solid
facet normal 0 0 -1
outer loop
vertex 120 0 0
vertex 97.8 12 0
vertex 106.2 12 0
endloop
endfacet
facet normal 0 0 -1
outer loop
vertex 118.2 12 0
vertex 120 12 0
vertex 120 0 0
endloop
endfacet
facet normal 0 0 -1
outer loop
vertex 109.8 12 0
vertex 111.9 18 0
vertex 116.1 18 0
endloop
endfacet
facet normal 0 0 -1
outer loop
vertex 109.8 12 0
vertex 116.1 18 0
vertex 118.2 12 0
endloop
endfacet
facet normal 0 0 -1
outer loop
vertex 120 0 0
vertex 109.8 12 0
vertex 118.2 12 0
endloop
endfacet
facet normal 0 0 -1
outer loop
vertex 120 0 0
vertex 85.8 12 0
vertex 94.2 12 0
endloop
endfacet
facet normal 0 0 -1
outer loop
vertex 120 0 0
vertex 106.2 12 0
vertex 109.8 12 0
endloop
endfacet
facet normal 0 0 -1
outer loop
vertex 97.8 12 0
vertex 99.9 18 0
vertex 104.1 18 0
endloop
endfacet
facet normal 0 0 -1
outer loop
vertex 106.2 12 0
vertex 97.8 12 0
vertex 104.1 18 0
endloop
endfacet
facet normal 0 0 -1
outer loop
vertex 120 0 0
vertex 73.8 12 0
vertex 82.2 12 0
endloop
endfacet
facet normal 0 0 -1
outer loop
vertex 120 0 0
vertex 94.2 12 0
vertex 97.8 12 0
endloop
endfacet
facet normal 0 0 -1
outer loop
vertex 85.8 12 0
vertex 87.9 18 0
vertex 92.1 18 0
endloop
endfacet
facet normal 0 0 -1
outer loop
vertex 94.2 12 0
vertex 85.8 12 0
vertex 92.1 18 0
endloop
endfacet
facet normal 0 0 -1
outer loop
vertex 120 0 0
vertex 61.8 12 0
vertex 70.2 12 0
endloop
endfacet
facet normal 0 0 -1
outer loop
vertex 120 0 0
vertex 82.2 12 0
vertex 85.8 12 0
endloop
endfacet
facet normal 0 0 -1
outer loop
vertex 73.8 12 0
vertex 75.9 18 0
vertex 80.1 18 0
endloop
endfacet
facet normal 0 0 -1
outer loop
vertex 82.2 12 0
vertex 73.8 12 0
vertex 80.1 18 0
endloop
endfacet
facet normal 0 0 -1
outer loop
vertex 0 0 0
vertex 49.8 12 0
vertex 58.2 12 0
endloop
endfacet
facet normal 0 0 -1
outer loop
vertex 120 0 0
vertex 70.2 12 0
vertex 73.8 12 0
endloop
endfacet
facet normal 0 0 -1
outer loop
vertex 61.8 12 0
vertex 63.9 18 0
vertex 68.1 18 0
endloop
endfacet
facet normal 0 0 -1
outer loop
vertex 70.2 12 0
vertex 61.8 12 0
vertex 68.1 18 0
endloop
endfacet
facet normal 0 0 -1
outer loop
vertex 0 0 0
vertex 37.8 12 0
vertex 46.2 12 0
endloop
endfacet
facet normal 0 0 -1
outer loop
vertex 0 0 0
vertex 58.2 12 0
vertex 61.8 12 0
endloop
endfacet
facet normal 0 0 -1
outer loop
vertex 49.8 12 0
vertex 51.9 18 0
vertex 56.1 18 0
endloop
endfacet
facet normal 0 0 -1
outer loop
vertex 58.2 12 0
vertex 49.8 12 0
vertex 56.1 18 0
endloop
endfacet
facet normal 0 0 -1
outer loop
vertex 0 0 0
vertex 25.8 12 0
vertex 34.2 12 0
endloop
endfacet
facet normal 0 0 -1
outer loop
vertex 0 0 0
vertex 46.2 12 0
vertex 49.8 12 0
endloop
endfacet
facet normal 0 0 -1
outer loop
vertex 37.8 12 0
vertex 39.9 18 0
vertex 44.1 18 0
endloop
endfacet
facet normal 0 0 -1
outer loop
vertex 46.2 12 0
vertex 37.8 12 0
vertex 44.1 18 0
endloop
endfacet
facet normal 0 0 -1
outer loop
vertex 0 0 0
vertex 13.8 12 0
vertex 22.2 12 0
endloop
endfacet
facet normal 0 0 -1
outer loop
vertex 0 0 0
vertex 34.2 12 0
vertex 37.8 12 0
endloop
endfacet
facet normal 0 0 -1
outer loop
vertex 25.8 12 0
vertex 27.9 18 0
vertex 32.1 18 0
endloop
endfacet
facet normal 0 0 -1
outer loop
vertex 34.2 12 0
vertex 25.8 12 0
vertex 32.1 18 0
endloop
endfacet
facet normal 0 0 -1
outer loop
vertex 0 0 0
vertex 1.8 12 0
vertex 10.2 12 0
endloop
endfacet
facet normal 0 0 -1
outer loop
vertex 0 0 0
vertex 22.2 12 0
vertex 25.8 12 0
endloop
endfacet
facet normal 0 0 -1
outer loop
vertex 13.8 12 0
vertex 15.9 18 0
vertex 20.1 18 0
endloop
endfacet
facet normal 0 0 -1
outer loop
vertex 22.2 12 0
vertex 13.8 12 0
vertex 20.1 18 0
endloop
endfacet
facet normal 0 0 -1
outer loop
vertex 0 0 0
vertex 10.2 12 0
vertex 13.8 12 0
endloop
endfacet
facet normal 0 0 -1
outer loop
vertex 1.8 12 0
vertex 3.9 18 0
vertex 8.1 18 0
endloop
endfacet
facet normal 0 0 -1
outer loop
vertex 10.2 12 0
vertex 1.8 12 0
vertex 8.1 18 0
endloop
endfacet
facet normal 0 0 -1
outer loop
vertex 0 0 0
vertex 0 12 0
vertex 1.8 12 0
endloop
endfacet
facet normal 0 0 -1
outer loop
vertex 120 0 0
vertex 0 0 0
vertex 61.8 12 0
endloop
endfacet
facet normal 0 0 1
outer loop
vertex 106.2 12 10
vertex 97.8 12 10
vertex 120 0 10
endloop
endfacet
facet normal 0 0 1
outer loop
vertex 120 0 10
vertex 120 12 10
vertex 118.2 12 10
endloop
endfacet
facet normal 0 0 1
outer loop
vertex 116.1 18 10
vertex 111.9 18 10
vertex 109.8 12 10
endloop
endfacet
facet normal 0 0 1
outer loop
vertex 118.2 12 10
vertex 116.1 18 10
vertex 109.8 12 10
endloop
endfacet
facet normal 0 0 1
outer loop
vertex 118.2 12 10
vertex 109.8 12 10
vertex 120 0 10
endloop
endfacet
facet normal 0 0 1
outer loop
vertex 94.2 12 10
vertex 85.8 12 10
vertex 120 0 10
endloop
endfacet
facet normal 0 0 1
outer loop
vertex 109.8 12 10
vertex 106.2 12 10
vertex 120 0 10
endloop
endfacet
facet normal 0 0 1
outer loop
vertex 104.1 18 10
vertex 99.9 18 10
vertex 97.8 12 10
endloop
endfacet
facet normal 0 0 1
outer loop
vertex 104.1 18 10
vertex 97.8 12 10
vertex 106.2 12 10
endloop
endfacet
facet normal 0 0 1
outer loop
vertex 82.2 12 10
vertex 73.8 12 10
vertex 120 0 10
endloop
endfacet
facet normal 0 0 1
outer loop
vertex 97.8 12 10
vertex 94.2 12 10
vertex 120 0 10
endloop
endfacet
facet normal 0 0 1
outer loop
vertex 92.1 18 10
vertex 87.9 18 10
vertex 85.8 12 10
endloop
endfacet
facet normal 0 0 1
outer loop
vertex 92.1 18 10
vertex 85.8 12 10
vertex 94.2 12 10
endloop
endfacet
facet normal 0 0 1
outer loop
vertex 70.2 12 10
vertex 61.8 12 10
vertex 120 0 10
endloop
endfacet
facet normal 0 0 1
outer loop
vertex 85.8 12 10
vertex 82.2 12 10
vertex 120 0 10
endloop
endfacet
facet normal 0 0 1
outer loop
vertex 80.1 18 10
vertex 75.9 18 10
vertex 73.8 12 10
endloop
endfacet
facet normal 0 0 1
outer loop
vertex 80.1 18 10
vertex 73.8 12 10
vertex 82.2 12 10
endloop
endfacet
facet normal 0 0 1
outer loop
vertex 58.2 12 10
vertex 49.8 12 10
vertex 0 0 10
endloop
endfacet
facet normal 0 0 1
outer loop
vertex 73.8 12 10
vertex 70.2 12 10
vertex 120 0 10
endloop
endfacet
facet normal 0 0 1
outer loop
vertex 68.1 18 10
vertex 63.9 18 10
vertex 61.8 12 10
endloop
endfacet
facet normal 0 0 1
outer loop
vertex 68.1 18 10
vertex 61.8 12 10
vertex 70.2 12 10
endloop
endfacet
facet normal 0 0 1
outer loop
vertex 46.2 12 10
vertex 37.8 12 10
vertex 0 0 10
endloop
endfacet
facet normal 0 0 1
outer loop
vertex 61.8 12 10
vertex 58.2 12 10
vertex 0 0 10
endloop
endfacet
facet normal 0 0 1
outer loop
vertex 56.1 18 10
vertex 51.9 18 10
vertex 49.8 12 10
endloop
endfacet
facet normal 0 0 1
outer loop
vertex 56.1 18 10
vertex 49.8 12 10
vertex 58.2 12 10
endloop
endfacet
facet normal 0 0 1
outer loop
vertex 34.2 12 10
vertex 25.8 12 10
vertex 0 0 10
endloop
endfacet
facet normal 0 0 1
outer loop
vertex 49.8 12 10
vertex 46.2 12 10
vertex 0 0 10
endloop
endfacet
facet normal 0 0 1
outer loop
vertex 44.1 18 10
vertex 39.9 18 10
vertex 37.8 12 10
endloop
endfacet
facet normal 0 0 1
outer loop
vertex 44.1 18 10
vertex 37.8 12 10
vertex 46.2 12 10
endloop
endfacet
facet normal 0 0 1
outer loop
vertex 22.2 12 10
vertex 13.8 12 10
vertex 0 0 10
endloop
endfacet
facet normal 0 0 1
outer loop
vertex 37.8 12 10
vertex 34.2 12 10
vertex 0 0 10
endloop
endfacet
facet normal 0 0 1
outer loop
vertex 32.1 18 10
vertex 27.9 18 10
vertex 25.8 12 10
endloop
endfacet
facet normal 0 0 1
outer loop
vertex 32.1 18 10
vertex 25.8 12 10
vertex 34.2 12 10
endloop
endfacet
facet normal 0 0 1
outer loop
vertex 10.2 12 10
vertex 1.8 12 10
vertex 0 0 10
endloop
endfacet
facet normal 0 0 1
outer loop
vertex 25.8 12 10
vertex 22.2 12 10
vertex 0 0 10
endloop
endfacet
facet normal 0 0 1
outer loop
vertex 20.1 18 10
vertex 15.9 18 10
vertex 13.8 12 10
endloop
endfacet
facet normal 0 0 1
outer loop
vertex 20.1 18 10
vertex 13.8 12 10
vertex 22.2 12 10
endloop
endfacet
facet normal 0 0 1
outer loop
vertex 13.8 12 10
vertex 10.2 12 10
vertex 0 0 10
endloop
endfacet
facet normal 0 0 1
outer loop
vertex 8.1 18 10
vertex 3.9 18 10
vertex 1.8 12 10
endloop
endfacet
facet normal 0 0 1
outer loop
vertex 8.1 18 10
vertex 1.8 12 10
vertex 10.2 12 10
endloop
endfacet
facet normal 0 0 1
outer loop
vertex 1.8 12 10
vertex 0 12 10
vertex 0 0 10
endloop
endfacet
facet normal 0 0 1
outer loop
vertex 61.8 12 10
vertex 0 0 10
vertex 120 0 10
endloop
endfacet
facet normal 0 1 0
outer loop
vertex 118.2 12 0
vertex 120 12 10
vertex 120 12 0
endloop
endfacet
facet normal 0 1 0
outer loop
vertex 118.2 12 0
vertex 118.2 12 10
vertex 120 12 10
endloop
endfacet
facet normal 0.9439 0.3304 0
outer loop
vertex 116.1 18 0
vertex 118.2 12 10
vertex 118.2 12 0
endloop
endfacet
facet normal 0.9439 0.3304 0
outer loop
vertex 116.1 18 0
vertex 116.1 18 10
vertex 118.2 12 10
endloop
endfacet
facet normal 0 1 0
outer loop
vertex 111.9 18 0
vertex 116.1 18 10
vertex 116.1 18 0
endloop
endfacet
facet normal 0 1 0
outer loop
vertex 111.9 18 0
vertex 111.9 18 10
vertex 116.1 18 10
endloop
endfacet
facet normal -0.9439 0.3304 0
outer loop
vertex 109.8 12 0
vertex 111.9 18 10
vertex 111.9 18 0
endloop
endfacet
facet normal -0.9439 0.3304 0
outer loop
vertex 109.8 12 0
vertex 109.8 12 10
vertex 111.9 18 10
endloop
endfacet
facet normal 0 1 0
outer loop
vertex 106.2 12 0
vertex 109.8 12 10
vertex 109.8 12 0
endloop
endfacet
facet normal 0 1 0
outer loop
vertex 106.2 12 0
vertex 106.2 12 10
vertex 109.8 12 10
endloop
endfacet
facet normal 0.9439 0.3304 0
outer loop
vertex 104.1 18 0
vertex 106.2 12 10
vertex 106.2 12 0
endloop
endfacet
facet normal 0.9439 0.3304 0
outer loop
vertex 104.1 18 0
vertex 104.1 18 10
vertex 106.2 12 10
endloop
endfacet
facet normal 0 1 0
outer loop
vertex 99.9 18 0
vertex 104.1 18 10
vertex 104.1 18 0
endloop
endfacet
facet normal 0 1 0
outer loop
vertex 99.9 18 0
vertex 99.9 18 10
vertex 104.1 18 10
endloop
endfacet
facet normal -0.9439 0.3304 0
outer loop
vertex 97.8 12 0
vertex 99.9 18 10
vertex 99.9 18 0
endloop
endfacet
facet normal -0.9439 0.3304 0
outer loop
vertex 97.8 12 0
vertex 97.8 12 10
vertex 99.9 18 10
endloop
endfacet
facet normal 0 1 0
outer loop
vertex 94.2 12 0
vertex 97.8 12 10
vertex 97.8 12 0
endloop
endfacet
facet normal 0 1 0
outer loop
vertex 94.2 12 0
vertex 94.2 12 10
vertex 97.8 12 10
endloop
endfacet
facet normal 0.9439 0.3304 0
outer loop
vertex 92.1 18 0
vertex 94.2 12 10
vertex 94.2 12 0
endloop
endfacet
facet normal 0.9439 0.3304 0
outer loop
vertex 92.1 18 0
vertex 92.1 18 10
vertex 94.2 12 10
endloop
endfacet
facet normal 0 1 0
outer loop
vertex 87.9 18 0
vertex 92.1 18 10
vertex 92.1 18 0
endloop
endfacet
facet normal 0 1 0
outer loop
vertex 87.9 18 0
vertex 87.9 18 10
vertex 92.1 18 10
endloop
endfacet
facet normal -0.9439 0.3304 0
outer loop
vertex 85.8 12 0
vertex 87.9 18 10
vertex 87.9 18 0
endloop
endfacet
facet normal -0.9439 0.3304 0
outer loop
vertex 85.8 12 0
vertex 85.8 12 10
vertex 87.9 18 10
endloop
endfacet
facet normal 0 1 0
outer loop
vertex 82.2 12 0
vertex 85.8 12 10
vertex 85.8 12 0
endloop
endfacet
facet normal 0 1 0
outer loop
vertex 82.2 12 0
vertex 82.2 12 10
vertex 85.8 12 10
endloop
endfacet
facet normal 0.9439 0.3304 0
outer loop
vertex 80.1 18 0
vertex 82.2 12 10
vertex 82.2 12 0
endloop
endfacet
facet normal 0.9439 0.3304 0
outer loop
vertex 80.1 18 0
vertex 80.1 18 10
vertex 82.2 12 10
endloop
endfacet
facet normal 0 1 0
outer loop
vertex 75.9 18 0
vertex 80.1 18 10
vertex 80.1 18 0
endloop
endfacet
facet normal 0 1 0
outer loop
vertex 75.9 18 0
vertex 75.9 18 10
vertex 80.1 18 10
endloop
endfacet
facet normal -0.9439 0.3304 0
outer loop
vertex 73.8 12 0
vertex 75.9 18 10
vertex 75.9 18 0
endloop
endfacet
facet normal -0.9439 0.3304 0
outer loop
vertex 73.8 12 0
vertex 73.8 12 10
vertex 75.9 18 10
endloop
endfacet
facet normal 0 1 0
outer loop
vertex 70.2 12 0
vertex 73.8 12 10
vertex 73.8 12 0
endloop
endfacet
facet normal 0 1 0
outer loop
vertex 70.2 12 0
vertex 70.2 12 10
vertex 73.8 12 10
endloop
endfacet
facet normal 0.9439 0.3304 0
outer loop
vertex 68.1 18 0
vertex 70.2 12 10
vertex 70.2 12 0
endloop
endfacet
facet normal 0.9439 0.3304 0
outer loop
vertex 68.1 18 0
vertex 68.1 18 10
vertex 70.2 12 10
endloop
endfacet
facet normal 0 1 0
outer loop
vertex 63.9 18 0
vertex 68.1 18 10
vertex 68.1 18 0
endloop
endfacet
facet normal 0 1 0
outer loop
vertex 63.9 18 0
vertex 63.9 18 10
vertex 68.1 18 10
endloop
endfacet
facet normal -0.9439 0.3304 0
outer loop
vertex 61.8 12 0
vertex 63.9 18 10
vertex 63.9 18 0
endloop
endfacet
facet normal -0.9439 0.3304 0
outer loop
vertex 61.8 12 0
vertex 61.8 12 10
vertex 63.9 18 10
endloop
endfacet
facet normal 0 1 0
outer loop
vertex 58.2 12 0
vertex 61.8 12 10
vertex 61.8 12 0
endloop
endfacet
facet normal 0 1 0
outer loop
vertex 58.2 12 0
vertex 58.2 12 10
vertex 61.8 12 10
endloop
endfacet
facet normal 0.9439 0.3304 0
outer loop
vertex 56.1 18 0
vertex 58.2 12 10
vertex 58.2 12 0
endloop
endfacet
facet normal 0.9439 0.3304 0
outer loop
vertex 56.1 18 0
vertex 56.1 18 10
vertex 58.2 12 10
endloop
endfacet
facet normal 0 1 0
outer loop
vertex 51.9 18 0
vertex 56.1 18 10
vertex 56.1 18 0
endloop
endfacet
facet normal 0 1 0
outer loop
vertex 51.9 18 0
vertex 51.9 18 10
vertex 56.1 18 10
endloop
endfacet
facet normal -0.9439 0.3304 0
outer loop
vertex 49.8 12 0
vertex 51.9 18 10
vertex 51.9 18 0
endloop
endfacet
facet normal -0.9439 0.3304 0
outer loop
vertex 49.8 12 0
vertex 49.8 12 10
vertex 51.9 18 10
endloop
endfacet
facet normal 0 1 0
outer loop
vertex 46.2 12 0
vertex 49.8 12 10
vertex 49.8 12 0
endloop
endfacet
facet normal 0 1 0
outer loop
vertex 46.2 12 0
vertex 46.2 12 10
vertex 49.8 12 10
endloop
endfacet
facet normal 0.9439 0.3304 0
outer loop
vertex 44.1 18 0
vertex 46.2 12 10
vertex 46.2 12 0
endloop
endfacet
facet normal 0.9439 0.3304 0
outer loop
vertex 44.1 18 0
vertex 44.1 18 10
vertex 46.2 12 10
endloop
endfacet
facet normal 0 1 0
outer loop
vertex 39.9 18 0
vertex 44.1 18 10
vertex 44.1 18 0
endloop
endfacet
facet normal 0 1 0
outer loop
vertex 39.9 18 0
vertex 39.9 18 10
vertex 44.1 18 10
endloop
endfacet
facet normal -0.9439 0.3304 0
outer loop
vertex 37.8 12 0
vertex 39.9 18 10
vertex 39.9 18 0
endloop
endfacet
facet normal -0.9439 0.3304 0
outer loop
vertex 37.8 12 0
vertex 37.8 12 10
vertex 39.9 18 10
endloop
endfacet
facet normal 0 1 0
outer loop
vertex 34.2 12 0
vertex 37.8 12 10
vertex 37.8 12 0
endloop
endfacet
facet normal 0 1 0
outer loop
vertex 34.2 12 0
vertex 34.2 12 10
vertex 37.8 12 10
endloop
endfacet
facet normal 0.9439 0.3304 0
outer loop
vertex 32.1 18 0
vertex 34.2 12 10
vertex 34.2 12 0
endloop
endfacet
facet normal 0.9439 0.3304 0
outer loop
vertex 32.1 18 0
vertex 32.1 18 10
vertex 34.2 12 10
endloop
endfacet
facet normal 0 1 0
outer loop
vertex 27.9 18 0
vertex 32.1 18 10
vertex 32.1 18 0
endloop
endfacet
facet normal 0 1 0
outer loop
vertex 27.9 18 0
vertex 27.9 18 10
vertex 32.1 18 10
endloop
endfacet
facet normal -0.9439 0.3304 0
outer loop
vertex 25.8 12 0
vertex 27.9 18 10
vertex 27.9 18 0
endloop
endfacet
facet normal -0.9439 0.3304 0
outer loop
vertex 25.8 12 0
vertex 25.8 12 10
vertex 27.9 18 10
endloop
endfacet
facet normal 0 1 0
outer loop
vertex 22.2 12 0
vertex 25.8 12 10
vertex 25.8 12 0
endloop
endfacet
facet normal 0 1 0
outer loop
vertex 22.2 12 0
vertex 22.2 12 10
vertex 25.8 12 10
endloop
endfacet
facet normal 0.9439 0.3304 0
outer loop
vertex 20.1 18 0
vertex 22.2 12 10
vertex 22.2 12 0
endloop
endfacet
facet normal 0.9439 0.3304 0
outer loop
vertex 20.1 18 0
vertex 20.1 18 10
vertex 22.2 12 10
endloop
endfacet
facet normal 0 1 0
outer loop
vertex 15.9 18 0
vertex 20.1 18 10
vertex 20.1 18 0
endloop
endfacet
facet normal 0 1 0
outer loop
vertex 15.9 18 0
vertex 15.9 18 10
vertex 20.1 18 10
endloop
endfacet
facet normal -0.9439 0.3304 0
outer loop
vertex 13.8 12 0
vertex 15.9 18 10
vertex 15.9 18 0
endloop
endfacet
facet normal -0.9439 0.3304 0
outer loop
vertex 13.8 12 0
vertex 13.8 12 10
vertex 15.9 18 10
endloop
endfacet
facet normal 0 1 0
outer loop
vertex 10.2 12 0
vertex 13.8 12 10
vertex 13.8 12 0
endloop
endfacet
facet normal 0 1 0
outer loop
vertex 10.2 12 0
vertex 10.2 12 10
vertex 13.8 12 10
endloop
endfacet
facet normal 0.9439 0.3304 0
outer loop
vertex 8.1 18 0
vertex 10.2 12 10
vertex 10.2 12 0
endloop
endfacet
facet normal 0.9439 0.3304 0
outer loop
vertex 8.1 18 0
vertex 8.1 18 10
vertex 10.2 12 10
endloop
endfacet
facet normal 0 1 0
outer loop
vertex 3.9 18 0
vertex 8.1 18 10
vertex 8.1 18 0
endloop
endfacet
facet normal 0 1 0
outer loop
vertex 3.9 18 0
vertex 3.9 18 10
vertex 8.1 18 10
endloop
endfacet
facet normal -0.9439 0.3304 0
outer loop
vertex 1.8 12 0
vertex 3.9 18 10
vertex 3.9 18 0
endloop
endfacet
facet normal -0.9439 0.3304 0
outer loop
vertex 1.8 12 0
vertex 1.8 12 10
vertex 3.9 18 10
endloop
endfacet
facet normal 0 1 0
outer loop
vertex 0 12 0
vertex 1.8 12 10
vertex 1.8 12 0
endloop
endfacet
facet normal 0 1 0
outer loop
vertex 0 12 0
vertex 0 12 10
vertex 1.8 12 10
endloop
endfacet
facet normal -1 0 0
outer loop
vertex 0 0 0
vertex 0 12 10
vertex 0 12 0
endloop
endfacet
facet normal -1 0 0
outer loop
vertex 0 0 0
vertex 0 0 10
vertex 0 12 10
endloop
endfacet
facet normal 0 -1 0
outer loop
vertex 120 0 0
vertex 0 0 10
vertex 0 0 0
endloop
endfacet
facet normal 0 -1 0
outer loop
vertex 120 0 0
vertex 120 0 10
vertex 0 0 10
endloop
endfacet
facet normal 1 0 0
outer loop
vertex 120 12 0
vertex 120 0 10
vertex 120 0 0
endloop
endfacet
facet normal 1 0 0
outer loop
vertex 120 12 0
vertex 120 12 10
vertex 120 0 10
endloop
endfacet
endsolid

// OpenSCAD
$fn = 32;

// ----------------------------------------------------------------------
// Gear rack: 10 teeth, pitch 12 mm
// ----------------------------------------------------------------------

// --- parameters (mm) ---
teeth = 10;               // number of teeth
pitch = 12;               // tooth pitch, X
root_w = 8.4;             // tooth width at the root
tip_w = 4.2;              // tooth width at the tip
base_h = 12;              // rack body height, Y
tooth_h = 6;              // tooth height above the body
plate_t = 10;             // rack width, Z (extrusion height)
fit_tol = 0.1;            // declared fit tolerance (prompt contract)
free_tol = 0.3;           // declared free tolerance (prompt contract)

rack_l = teeth * pitch;  // overall length
total_h = base_h + tooth_h;  // overall height

profile = [[0, 0], [120, 0], [120, 12], [118.2, 12], [116.1, 18], [111.9, 18], [109.8, 12], [106.2, 12], [104.1, 18], [99.9, 18], [97.8, 12], [94.2, 12], [92.1, 18], [87.9, 18], [85.8, 12], [82.2, 12], [80.1, 18], [75.9, 18], [73.8, 12], [70.2, 12], [68.1, 18], [63.9, 18], [61.8, 12], [58.2, 12], [56.1, 18], [51.9, 18], [49.8, 12], [46.2, 12], [44.1, 18], [39.9, 18], [37.8, 12], [34.2, 12], [32.1, 18], [27.9, 18], [25.8, 12], [22.2, 12], [20.1, 18], [15.9, 18], [13.8, 12], [10.2, 12], [8.1, 18], [3.9, 18], [1.8, 12], [0, 12]];  // primary outline, 44 points, counter clockwise

// --- the one profile operation ---
linear_extrude(height = plate_t) polygon(points = profile);
